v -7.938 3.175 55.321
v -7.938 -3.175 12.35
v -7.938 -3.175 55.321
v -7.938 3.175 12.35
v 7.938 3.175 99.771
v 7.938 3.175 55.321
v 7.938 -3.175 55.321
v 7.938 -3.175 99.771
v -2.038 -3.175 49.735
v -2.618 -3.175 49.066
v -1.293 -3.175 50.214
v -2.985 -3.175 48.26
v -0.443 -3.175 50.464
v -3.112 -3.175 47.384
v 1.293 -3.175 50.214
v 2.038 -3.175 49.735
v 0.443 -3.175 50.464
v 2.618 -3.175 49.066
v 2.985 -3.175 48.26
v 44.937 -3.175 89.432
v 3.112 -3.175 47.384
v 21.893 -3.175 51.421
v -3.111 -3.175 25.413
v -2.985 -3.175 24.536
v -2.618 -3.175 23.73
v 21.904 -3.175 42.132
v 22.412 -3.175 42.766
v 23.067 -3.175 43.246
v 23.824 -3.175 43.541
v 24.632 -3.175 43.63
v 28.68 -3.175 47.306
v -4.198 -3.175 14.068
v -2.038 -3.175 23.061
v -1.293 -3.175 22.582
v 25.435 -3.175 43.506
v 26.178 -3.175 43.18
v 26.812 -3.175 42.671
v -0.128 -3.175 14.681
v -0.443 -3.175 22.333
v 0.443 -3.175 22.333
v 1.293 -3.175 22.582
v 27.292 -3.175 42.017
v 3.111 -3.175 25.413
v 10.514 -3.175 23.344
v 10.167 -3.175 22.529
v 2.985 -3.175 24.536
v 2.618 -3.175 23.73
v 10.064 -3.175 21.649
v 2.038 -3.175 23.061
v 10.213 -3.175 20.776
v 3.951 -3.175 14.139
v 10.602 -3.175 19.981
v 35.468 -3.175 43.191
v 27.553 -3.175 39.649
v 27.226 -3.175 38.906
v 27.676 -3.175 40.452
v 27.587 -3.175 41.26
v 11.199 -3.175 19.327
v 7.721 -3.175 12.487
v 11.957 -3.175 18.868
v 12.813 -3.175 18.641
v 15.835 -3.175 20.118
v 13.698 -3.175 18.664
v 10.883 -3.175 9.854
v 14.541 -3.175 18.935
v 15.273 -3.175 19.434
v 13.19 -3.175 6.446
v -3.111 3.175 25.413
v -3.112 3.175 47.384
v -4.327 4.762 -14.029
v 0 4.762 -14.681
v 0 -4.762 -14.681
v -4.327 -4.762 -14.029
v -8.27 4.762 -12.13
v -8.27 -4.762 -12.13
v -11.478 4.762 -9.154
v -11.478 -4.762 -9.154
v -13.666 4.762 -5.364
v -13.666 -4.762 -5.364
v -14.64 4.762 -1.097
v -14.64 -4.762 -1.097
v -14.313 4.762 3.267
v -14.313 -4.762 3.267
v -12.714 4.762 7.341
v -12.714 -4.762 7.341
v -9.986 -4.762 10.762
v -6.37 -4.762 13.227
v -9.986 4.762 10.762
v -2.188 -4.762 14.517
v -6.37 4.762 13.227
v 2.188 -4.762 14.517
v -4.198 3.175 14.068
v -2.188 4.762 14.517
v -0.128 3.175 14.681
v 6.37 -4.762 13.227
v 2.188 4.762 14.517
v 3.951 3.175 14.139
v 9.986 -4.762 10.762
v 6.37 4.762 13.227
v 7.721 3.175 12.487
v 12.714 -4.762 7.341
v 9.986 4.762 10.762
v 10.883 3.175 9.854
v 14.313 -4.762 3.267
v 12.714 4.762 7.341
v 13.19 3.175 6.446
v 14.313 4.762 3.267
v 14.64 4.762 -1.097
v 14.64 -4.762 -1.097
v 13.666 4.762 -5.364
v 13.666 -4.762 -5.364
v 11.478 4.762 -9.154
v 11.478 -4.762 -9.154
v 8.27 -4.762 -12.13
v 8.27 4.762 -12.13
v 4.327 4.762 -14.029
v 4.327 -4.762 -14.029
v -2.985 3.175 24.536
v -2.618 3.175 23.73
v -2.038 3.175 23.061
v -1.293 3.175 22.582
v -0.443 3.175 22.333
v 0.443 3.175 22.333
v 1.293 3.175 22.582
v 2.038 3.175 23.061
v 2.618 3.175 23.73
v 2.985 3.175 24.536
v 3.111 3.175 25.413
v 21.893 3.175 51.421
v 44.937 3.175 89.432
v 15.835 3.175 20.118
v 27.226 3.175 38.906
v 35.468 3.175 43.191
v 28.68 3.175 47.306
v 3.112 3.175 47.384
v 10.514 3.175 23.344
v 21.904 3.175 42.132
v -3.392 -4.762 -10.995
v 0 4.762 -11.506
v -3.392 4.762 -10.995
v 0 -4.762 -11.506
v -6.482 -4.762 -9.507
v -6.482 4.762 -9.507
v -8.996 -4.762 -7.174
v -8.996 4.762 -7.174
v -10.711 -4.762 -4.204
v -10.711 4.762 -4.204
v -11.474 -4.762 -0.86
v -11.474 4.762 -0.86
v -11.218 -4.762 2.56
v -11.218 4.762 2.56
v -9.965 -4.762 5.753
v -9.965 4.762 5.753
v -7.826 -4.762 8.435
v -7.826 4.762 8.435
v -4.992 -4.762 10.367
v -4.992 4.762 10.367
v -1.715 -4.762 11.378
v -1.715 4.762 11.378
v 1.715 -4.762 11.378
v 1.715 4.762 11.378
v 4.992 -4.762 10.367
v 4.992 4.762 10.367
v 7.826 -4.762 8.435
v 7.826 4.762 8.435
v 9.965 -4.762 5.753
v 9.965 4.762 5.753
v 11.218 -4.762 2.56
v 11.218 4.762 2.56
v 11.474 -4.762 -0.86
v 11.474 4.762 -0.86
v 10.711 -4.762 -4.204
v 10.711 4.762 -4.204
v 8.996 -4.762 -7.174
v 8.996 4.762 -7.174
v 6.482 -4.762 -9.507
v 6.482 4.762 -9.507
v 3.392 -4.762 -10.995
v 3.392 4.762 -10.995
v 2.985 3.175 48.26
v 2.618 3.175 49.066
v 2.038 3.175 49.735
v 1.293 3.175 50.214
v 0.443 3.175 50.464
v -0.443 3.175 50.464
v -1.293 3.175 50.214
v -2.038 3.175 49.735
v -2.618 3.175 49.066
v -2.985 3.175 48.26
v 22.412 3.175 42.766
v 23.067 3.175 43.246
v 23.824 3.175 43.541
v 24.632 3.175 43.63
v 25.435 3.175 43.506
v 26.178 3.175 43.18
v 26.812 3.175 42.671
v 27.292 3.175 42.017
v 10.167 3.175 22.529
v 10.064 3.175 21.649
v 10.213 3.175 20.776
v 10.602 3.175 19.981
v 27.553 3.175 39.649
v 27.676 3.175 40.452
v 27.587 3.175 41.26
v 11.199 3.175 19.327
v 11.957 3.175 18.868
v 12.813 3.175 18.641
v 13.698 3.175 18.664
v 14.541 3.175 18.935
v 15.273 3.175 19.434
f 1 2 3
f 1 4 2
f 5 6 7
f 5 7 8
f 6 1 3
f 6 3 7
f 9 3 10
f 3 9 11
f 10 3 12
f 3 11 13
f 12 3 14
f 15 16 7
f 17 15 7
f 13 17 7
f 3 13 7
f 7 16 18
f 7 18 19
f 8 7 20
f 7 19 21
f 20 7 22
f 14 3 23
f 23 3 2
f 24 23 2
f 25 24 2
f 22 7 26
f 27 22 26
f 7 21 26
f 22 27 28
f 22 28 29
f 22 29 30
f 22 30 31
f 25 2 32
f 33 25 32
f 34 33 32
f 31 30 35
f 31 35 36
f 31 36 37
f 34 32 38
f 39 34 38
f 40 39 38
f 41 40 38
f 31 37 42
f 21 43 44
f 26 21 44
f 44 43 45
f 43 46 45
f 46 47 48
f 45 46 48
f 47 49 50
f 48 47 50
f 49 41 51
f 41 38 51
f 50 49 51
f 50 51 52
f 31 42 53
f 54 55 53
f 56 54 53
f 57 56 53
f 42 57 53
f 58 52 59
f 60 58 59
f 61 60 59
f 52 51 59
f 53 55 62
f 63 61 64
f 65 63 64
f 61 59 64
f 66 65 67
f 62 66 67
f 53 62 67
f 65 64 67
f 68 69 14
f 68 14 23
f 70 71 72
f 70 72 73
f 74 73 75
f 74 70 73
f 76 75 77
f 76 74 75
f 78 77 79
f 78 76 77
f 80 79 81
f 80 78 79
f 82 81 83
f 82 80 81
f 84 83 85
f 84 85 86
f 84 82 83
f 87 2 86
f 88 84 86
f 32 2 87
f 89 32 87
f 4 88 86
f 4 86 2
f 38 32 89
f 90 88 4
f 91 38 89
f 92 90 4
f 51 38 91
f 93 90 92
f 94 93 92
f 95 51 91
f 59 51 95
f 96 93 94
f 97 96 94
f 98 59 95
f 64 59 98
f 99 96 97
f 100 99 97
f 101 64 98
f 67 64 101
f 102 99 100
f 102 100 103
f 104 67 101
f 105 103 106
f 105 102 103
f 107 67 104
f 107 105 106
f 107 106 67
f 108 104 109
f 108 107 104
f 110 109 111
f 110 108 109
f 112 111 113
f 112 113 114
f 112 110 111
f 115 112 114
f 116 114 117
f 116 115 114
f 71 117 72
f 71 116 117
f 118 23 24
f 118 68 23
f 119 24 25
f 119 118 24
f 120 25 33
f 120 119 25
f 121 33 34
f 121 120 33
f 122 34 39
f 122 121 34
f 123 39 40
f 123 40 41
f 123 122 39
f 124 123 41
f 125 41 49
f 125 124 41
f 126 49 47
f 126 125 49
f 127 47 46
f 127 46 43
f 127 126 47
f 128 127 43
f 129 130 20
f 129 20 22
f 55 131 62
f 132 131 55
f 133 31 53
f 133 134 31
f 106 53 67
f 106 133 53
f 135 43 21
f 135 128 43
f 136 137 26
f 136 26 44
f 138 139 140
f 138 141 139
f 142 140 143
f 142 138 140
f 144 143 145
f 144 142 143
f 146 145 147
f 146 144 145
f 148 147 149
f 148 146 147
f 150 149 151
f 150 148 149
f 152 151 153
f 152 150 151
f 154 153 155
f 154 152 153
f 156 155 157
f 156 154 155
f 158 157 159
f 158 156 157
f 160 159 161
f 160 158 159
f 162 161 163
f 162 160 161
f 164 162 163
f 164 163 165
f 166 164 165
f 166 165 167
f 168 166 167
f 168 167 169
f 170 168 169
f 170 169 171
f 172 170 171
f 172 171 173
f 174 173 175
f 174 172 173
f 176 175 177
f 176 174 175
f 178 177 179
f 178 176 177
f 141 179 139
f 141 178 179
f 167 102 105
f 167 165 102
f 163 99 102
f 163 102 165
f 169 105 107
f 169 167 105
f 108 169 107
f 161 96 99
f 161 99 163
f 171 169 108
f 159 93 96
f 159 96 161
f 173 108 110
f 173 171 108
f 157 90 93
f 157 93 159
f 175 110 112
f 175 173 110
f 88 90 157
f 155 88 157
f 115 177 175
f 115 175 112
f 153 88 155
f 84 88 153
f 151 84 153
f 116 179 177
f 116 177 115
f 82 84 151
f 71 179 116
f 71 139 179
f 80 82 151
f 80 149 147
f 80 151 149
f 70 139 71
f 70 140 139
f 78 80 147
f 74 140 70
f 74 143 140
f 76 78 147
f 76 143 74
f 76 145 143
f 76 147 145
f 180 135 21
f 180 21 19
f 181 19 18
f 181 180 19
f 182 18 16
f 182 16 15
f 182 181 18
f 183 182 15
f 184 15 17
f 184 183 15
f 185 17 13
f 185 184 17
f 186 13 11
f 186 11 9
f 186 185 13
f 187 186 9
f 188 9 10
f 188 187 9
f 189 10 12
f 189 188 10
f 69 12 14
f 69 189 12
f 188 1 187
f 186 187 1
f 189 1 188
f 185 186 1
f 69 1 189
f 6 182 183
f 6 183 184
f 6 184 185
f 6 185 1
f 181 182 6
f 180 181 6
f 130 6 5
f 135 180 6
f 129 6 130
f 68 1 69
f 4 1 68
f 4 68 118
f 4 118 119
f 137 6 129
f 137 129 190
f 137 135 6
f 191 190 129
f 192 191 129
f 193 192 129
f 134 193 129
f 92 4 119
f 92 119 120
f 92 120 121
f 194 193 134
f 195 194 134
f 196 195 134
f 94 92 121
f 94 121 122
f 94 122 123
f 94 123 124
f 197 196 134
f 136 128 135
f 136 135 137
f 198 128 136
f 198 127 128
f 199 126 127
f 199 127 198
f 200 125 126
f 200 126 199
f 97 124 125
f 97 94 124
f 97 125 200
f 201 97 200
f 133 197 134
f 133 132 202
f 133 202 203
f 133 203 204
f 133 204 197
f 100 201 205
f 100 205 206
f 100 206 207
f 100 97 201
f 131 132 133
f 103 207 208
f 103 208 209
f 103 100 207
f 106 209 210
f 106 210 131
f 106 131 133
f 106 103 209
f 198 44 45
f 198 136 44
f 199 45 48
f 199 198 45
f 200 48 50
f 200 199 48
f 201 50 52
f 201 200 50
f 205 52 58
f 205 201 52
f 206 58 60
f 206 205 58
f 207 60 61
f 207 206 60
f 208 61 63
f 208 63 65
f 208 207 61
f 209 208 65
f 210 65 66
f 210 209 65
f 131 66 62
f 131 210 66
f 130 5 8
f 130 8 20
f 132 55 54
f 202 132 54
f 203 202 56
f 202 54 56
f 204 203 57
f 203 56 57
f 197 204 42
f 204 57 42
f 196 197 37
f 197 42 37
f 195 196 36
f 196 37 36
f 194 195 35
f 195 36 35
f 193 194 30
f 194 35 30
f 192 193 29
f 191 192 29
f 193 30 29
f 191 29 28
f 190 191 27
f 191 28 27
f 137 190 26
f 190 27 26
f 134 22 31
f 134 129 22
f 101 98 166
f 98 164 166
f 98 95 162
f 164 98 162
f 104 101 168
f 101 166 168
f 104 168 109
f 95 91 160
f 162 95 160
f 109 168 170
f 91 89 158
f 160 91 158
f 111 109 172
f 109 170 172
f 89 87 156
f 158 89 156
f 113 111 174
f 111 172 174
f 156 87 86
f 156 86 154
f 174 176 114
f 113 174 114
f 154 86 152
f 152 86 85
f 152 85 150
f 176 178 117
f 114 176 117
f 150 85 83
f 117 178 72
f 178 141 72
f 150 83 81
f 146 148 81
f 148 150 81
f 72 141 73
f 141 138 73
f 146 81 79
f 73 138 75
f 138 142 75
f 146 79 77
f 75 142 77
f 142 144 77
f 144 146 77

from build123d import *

# Parameters (mm, degrees)
SKETCH1_R             = 11.5062
BEARING_EXTRUDE_DEPTH = 4.7625
BOSS_EXTRUDE2_DEPTH   = 3.175


with BuildPart() as part:
    # Sketch1 → Bearing extrude (new, symmetric)
    with BuildSketch(Plane(origin=(0, 0, 0), x_dir=(1, 0, 0), z_dir=(0, 1, 0))):
        with BuildLine():
            ThreePointArc((14.6812, 0), (-7.035822924, 12.885450292), (-7.9375, -12.350454534))
            ThreePointArc((-7.9375, -12.350454534), (3.951379748, -14.13945655), (13.190345938, -6.446115688))
            ThreePointArc((13.190345938, -6.446115688), (14.303631361, -3.308135929), (14.6812, 0))
        make_face()
        Circle(SKETCH1_R, mode=Mode.SUBTRACT)
    extrude(amount=BEARING_EXTRUDE_DEPTH, both=True)

    # Sketch1<5> → Boss-Extrude2 (add, symmetric)
    with BuildSketch(Plane(origin=(0, 0, 0), x_dir=(1, 0, 0), z_dir=(0, 1, 0))):
        with BuildLine():
            Line((-7.9375, -12.350454534), (-7.9375, -55.3212))
            Line((-7.9375, -55.3212), (7.9375, -55.3212))
            Line((7.9375, -55.3212), (7.9375, -99.7712))
            Line((7.9375, -99.7712), (44.936648924, -89.431503617))
            Line((44.936648924, -89.431503617), (21.89252839, -51.421360118))
            Line((21.89252839, -51.421360118), (28.680054014, -47.306338594))
            Line((28.680054014, -47.306338594), (35.467579639, -43.19131707))
            Line((35.467579639, -43.19131707), (13.190345938, -6.446115688))
            ThreePointArc((13.190345938, -6.446115688), (3.951379748, -14.13945655), (-7.9375, -12.350454534))
        make_face()
        with BuildLine():
            ThreePointArc((3.1115, -47.3837), (0, -50.4952), (-3.1115, -47.3837))
            Line((-3.1115, -47.3837), (-3.1115, -25.4127))
            ThreePointArc((-3.1115, -25.4127), (0, -22.3012), (3.1115, -25.4127))
            Line((3.1115, -25.4127), (3.1115, -47.3837))
        make_face(mode=Mode.SUBTRACT)
        with BuildLine():
            ThreePointArc((27.225742535, -38.905724532), (27.587064378, -41.259593312), (26.178120928, -43.179523014))
            ThreePointArc((26.178120928, -43.179523014), (23.824252147, -43.540844858), (21.904322445, -42.131901407))
            Line((21.904322445, -42.131901407), (10.513942867, -23.344030478))
            ThreePointArc((10.513942867, -23.344030478), (11.561564474, -19.070231995), (15.835362956, -20.117853603))
            Line((15.835362956, -20.117853603), (27.225742535, -38.905724532))
        make_face(mode=Mode.SUBTRACT)
    extrude(amount=BOSS_EXTRUDE2_DEPTH, both=True)


solid = part.part
